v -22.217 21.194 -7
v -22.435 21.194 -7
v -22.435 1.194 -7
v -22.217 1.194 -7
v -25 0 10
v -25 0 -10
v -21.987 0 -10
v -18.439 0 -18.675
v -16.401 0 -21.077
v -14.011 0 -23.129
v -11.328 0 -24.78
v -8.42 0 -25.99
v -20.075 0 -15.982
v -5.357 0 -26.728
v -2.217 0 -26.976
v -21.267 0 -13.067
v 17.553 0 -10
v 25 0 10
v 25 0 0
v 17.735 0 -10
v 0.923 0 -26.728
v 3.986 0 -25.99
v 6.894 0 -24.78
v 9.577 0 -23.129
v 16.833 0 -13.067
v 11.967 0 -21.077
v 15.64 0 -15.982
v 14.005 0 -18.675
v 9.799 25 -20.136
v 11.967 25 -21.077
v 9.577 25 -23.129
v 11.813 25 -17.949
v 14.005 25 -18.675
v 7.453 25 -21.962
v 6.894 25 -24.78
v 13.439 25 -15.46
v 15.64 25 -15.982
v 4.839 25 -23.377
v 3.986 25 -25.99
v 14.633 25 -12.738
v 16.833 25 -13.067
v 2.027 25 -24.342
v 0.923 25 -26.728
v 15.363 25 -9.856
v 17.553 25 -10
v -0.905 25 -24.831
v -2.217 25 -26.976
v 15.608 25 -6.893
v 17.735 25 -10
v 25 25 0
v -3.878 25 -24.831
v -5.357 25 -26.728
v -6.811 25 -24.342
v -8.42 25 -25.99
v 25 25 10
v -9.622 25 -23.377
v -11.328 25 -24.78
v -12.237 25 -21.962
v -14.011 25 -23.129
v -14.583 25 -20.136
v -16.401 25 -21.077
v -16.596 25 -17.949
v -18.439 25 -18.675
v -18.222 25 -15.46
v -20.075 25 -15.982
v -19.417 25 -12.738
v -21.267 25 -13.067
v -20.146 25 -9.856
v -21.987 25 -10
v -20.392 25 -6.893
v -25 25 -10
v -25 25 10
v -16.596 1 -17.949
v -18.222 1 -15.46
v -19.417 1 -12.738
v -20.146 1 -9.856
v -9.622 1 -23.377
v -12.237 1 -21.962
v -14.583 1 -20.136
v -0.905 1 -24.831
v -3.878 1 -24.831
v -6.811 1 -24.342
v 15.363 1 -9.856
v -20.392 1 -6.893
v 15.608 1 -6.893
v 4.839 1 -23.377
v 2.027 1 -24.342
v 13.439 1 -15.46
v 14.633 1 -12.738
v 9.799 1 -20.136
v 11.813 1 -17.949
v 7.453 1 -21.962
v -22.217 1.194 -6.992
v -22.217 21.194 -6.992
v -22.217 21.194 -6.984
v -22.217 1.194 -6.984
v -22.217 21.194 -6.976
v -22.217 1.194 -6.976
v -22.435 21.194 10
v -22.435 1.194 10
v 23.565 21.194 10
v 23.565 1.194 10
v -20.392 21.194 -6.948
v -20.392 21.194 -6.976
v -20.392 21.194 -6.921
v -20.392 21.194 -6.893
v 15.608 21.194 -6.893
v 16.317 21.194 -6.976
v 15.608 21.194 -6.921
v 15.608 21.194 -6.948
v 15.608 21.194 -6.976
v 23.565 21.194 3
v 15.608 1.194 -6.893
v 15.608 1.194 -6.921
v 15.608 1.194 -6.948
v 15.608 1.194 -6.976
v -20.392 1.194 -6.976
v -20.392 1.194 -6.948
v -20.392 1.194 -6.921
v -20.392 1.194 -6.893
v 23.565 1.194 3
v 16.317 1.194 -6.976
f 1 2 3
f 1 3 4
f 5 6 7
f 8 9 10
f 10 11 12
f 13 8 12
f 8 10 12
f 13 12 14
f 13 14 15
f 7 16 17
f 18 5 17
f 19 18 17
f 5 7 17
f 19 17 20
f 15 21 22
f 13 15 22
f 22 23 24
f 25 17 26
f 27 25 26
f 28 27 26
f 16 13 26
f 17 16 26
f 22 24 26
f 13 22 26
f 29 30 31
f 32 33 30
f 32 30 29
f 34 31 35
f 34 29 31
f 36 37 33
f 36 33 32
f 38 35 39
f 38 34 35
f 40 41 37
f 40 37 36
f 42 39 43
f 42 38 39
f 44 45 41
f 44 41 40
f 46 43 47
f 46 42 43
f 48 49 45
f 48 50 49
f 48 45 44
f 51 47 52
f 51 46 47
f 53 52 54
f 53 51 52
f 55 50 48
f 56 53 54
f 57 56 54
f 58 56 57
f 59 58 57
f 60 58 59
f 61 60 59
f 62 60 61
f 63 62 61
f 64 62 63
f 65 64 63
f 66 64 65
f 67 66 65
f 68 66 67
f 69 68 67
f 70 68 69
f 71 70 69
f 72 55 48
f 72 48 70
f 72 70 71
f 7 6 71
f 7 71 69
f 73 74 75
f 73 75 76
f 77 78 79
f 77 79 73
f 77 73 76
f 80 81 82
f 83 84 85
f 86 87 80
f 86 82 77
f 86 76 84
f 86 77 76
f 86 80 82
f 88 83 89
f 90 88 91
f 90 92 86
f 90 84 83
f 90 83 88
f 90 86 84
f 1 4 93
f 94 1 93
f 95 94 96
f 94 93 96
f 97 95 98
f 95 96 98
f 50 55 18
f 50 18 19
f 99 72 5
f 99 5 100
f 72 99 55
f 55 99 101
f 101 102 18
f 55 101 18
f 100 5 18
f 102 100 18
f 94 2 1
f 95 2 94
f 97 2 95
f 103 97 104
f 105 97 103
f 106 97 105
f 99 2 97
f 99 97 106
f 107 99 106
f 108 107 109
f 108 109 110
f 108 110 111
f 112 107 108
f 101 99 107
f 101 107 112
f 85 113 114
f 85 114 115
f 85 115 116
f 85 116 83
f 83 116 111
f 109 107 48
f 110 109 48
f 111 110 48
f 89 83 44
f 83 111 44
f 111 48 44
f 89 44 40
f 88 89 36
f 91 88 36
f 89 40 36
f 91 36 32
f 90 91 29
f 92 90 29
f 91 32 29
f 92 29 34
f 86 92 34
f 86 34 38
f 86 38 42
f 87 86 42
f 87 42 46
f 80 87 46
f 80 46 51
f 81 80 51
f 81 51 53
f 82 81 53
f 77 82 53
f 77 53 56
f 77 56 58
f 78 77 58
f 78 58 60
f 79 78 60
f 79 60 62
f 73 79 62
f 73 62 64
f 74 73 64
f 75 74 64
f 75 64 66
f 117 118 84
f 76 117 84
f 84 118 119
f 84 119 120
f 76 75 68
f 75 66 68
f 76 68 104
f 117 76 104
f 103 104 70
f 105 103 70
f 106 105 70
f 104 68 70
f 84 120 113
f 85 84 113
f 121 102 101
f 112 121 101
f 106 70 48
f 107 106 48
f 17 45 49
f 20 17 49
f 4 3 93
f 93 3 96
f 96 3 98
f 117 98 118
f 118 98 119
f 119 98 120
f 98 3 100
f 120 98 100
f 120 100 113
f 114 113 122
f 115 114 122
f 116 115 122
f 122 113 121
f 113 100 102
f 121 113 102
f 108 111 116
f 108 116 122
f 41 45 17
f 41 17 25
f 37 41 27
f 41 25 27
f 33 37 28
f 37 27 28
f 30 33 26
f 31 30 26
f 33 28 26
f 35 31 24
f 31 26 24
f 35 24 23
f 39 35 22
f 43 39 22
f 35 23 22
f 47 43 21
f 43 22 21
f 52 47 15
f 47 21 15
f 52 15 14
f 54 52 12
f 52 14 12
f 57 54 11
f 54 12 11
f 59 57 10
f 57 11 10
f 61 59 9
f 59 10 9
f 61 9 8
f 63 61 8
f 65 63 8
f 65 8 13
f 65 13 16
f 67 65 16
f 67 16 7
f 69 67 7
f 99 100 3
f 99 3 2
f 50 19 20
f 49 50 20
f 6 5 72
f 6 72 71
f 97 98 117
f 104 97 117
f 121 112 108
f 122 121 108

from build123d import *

# Parameters (mm, degrees)
CROQUIS1_W              = 50
CROQUIS1_H              = 20
SALIENTE_EXTRUIR1_DEPTH = 25
CROQUIS5_W              = 46
CROQUIS5_H              = 20
CORTAR_EXTRUIR1_DEPTH   = 17
SALIENTE_EXTRUIR2_DEPTH = 25
CORTAR_EXTRUIR5_DEPTH   = 24
CHAFL_N2_SIZE           = 10
CHAFL_N2_SIZE_2         = 7.26542528


with BuildPart() as part:
    # Croquis1 → Saliente-Extruir1 (new body)
    with BuildSketch(Plane(origin=(0, 0, 0), x_dir=(1, 0, 0), z_dir=(0, 1, 0))):
        Rectangle(CROQUIS1_W, CROQUIS1_H)
    extrude(amount=SALIENTE_EXTRUIR1_DEPTH)

    # Croquis5 → Cortar-Extruir1 (cut)
    with BuildSketch(Plane(origin=(0, 2.566177554, 10), x_dir=(1, 0, 0), z_dir=(0, 0, 1))):
        with Locations((0.564953321, 8.627432653)):
            Rectangle(CROQUIS5_W, CROQUIS5_H)
    extrude(amount=-CORTAR_EXTRUIR1_DEPTH, mode=Mode.SUBTRACT)

    # Croquis6 → Saliente-Extruir2 (add)
    with BuildSketch(Plane.XZ):
        with BuildLine():
            Line((-22.217043892, -6.976270562), (17.782956108, -6.976270562))
            ThreePointArc((17.782956108, -6.976270562), (-2.217043892, -26.976270562), (-22.217043892, -6.976270562))
        make_face()
    extrude(amount=-SALIENTE_EXTRUIR2_DEPTH)

    # Croquis11 → Cortar-Extruir5 (cut)
    with BuildSketch(Plane(origin=(0, 25, 0), x_dir=(1, 0, 0), z_dir=(0, 1, 0))):
        with BuildLine():
            Line((-20.391864193, 6.892929863), (15.608135807, 6.892929863))
            ThreePointArc((15.608135807, 6.892929863), (-2.391864193, 24.892929863), (-20.391864193, 6.892929863))
        make_face()
    extrude(amount=-CORTAR_EXTRUIR5_DEPTH, mode=Mode.SUBTRACT)

    # Chaflán2
    # the kernel refuses this chamfer: 10, 7.26542528 mm, written as the material it adds along each edge
    with BuildSketch(Plane(origin=(23.564953321, 1.193610207, -7), x_dir=(0.022768510603911864, 0, 0.9997407638607518), z_dir=(0, 1, 0))) as chafl_n2_piece_1:
        Polygon((CHAFL_N2_SIZE * 0.999740763861, -CHAFL_N2_SIZE * 0.0227685106039), (-CHAFL_N2_SIZE_2 * 0.0227685106041, -CHAFL_N2_SIZE_2 * 0.999740763868), (0, 0), align=None)
    extrude(amount=20)
    # the kernel refuses this chamfer: 10, 7.26542528 mm, written as the material it takes off along each edge
    with BuildSketch(Plane(origin=(25, -25.815709359, -10), x_dir=(0.022768510603911864, 0, 0.9997407638607518), z_dir=(0, 1, 0))) as chafl_n2_2_piece_1:
        Polygon((CHAFL_N2_SIZE * 0.999740763861, -CHAFL_N2_SIZE * 0.0227685106039), (-CHAFL_N2_SIZE_2 * 0.0227685106041, -CHAFL_N2_SIZE_2 * 0.999740763868), (0, 0), align=None)
    extrude(amount=76.631418718, mode=Mode.SUBTRACT)


solid = part.part
